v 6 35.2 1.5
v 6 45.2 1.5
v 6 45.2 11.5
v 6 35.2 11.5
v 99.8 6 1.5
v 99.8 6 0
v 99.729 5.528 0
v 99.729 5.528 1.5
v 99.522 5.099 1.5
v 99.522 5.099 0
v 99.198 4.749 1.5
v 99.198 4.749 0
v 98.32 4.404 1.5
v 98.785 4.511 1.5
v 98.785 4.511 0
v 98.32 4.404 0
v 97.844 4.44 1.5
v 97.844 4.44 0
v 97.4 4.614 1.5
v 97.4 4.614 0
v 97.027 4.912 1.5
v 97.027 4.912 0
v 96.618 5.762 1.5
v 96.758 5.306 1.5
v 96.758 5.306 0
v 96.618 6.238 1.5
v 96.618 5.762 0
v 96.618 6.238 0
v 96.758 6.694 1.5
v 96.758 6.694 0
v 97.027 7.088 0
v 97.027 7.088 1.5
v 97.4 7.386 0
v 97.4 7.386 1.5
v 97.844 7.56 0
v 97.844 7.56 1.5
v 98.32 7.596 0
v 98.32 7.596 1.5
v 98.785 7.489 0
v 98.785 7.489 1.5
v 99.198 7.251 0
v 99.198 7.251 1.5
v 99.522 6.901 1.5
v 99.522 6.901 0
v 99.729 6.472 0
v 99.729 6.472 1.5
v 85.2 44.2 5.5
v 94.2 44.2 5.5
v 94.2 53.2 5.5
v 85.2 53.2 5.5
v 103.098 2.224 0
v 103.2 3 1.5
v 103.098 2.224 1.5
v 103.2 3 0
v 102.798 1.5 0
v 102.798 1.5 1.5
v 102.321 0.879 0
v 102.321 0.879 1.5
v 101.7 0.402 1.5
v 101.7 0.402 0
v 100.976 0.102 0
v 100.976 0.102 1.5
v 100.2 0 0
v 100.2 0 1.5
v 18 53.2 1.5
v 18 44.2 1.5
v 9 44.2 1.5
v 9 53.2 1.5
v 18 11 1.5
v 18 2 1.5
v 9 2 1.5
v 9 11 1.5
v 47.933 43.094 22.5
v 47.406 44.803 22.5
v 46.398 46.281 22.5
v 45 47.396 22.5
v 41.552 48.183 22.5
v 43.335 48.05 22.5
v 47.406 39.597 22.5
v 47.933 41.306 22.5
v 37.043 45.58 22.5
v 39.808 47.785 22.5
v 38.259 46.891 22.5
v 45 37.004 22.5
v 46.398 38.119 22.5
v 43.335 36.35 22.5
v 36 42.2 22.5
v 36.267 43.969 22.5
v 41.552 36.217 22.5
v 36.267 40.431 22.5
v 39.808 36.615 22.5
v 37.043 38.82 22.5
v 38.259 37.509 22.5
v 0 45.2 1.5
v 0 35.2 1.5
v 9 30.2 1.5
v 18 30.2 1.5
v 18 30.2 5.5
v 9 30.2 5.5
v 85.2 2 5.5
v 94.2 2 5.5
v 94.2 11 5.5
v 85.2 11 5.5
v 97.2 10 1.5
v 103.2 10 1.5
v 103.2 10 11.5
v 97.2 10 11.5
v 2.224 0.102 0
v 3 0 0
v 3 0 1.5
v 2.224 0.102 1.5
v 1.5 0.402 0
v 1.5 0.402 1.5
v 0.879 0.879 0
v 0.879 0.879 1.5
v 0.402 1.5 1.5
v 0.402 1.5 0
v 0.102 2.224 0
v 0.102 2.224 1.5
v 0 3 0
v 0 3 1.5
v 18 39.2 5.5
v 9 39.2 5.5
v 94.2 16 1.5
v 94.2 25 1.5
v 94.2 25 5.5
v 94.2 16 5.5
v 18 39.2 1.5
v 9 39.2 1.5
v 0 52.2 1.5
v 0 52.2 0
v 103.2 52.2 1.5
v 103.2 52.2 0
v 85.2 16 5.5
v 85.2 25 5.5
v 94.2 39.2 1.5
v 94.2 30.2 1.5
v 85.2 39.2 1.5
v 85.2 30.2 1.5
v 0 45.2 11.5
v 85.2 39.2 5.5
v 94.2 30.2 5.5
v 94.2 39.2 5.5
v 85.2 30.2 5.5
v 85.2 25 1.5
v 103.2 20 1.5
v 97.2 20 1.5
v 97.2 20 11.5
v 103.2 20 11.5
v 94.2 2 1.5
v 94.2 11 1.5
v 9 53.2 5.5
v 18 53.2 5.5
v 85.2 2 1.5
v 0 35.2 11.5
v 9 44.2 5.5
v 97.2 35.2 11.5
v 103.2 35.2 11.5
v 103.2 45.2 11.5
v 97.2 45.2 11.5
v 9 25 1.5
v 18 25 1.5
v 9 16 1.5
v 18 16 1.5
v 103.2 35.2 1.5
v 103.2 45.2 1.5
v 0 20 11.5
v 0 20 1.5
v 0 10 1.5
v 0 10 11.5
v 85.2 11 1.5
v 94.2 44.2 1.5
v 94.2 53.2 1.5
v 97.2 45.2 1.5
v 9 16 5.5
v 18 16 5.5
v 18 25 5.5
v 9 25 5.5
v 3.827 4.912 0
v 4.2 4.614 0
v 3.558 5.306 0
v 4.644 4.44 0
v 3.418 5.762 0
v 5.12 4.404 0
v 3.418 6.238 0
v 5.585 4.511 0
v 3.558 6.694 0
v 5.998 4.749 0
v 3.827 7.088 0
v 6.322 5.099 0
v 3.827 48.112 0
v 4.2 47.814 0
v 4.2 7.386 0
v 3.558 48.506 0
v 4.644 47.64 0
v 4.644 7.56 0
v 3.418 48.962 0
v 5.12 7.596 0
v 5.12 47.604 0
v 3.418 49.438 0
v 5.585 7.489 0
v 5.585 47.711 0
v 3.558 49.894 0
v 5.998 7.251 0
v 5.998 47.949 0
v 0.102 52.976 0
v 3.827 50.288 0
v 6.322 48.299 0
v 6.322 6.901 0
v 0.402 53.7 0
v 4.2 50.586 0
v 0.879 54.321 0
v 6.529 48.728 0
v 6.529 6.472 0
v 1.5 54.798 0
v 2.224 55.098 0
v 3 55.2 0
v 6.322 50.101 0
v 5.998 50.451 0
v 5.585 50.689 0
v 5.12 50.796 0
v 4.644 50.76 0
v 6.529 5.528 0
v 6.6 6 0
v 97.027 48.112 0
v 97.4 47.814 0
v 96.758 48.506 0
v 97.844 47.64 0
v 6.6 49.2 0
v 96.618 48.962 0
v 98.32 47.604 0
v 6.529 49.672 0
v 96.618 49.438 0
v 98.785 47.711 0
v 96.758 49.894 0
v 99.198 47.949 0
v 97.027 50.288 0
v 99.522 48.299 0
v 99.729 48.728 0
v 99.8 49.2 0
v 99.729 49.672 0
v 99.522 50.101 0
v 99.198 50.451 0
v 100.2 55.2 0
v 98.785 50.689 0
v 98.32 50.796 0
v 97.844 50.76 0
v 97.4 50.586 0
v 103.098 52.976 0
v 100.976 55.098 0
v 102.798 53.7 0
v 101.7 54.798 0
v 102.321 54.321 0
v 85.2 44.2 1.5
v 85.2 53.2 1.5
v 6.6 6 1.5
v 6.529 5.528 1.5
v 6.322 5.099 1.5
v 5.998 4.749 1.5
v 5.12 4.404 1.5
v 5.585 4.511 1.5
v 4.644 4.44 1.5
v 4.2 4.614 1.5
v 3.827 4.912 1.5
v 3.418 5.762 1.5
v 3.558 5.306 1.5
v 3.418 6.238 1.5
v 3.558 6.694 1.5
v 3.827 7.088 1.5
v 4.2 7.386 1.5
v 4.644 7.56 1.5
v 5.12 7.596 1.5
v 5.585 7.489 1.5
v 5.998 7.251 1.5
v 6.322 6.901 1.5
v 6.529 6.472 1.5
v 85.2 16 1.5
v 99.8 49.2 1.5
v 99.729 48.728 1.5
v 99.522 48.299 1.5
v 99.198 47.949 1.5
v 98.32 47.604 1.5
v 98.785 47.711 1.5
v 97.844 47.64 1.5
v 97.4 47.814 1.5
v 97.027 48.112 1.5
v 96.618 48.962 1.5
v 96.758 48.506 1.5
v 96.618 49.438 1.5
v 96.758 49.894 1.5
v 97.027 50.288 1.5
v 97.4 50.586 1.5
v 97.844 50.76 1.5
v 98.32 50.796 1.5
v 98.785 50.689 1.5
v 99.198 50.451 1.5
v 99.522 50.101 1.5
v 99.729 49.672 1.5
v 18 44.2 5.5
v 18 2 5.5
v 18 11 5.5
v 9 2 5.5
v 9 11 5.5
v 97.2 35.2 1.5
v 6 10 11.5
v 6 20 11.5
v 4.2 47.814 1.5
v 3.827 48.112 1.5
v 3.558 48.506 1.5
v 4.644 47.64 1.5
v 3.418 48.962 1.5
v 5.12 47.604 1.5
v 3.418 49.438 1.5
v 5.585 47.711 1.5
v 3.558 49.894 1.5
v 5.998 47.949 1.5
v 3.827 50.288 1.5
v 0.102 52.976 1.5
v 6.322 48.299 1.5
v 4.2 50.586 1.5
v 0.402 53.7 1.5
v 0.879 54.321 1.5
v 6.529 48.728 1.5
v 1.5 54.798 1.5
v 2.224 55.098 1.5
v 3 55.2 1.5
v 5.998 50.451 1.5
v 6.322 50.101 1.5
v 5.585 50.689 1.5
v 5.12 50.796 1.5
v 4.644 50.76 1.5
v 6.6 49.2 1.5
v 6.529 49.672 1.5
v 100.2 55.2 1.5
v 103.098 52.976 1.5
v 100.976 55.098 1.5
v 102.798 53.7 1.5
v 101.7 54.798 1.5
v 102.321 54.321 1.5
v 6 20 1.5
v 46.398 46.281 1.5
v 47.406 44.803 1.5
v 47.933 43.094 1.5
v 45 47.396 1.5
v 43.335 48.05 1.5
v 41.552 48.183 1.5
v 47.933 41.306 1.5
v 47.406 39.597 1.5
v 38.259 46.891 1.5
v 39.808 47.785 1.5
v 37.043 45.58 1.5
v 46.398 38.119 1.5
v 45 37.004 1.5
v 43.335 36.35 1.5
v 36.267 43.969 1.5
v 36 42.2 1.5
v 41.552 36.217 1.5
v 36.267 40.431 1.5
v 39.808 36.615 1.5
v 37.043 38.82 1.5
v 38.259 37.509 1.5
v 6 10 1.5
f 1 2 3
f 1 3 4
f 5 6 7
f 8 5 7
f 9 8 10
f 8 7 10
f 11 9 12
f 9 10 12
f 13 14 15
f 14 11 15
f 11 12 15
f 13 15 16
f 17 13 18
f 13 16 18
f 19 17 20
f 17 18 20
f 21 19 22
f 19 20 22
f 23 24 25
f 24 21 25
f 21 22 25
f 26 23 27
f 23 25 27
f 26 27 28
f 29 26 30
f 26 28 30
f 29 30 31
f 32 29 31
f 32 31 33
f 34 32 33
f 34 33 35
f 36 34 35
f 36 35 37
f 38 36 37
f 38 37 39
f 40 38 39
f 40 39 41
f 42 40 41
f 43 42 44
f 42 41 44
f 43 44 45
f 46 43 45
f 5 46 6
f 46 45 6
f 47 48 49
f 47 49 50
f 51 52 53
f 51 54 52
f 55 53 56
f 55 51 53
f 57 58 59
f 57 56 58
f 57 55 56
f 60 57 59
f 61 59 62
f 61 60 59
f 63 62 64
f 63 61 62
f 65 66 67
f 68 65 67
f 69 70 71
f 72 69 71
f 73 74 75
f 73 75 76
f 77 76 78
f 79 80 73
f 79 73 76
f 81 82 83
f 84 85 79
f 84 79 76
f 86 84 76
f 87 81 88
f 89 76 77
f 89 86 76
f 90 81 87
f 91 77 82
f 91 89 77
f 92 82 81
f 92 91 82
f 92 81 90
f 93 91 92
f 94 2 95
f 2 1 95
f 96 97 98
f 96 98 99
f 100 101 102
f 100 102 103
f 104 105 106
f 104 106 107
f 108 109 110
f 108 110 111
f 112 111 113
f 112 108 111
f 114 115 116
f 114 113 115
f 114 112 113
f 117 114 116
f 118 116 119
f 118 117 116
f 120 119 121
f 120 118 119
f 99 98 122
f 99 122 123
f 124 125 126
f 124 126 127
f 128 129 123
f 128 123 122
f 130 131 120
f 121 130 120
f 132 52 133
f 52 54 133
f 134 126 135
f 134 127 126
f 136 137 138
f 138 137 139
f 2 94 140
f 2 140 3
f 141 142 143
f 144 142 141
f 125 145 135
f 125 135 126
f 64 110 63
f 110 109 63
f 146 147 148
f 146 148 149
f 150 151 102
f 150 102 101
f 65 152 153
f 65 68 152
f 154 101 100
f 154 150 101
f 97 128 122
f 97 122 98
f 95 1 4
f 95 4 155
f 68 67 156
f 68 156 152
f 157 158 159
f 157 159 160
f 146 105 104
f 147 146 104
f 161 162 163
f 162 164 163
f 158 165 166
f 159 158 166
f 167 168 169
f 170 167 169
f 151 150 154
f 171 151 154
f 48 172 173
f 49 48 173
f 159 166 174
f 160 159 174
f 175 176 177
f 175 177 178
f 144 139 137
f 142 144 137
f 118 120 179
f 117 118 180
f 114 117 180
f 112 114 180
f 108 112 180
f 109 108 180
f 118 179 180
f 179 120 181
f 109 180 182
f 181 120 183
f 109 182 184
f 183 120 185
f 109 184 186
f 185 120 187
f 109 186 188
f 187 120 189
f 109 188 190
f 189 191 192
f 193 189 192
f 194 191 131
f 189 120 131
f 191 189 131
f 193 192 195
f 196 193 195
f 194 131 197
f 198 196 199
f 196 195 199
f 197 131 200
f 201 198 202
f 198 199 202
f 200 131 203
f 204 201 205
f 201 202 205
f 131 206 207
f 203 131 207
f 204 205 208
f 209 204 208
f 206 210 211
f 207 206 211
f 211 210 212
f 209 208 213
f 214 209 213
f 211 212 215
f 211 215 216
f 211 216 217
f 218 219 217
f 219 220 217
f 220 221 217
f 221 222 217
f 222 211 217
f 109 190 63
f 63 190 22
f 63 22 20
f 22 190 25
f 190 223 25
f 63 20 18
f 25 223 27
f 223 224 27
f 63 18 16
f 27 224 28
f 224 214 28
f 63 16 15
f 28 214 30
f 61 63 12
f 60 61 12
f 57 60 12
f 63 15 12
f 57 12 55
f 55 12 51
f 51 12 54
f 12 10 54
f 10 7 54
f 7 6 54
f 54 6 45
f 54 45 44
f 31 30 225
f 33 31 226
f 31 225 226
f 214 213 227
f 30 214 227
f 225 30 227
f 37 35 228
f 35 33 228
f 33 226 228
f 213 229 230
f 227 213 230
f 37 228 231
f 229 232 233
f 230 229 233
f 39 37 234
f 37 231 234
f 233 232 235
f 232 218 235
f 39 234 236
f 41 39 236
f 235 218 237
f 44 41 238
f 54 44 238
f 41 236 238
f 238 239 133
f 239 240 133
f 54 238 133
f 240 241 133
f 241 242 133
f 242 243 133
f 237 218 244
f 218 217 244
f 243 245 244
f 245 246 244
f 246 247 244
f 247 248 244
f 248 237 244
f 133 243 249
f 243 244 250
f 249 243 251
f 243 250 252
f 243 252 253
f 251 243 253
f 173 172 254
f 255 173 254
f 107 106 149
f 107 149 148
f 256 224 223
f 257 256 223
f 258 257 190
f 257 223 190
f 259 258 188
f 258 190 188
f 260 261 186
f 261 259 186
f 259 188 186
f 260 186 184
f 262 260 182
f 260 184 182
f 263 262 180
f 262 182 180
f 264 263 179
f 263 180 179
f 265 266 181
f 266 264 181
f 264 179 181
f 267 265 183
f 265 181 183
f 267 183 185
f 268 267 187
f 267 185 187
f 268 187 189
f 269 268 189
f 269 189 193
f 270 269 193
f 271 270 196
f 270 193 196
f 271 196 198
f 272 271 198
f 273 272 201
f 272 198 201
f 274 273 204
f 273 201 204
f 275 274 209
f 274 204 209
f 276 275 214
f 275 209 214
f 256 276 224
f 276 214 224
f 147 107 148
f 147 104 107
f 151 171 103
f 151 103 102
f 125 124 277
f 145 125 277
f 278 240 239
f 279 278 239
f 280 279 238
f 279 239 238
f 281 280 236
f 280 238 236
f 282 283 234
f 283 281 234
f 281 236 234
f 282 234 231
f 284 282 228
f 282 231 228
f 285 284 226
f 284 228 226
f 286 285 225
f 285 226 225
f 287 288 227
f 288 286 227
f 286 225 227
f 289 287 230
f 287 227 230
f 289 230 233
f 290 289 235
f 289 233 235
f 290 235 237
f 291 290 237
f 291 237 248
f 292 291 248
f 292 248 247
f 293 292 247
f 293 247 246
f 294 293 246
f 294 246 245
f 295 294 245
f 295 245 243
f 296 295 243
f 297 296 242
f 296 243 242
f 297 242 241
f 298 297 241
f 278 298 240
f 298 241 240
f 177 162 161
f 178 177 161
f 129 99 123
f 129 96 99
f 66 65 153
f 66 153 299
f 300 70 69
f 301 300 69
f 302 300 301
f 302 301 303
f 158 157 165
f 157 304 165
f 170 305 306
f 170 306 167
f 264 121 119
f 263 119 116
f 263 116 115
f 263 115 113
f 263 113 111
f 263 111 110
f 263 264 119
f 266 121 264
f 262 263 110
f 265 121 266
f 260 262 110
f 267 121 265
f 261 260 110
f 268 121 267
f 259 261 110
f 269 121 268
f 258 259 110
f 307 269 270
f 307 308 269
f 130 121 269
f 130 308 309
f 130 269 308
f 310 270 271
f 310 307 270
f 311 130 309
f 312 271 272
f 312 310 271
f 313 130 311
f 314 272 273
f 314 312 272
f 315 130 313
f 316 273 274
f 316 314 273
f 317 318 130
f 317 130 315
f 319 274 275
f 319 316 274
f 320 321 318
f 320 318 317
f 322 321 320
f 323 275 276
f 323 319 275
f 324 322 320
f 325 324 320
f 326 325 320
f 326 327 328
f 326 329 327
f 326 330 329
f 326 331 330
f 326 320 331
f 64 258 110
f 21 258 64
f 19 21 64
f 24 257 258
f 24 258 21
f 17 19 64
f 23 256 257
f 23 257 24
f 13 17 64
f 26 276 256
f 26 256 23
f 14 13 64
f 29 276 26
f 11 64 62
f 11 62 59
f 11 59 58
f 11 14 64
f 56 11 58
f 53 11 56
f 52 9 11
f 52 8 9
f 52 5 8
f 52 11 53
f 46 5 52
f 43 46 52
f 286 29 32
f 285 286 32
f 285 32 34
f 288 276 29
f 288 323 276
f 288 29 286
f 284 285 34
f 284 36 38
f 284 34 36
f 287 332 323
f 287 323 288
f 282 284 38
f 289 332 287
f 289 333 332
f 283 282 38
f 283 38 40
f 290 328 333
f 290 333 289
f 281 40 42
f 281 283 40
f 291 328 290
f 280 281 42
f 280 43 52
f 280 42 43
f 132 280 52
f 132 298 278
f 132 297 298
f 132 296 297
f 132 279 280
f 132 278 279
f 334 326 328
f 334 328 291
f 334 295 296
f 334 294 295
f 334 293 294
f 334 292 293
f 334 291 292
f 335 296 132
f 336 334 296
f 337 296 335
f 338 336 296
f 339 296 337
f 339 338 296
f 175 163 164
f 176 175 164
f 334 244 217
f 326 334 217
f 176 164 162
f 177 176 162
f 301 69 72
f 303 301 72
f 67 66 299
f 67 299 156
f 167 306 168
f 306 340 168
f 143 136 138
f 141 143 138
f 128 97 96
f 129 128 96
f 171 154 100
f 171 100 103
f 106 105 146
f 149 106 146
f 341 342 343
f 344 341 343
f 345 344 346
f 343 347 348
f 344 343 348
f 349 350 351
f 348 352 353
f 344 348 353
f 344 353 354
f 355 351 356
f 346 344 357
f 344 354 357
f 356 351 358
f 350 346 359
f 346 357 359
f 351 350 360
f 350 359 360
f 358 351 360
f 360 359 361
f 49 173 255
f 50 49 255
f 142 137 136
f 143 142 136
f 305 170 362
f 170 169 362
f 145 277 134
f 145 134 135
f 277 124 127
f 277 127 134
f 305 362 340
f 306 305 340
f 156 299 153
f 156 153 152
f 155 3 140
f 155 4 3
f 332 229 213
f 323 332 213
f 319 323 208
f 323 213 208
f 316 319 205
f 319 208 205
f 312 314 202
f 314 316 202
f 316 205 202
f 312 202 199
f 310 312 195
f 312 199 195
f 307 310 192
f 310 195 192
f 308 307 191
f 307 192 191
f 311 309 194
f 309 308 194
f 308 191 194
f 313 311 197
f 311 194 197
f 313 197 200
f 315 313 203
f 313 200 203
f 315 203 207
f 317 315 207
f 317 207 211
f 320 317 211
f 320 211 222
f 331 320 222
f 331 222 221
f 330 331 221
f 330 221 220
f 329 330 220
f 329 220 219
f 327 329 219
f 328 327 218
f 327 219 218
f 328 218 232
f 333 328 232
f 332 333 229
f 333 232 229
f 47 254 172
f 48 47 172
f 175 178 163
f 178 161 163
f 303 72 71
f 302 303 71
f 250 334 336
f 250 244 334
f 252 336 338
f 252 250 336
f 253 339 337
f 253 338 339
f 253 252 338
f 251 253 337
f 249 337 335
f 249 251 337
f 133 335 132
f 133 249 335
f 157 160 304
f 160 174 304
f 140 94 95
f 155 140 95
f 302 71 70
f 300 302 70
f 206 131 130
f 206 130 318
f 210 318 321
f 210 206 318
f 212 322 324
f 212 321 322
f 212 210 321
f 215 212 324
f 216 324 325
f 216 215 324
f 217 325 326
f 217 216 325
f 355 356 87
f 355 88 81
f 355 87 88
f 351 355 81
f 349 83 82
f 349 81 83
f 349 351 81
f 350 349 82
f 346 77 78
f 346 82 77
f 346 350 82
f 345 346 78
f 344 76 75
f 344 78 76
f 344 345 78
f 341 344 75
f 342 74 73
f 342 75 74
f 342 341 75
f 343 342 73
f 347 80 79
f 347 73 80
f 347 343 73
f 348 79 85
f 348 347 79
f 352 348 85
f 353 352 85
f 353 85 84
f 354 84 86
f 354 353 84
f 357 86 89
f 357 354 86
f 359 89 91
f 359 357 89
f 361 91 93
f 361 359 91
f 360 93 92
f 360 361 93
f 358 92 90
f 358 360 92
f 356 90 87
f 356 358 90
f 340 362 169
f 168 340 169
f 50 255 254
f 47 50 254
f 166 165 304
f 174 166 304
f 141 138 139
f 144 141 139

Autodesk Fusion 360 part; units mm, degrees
sketch "草图1" plane through (0, 0, 0) normal (0, 0, 1) x (1, 0, 0)
  line L0 (3, 0) -> (100.2, 0)
  line L1 (103.2, 3) -> (103.2, 52.2)
  line L2 (100.2, 55.2) -> (3, 55.2)
  line L3 (0, 52.2) -> (0, 3)
  line L4 (-10, 27.6) -> (117.08, 27.6)
  line L5 (51.6, 65) -> (51.6, -15)
  circle A0 centre (5, 49.2) radius 1.6
  circle A1 centre (98.2, 49.2) radius 1.6
  circle A2 centre (5, 6) radius 1.6
  circle A3 centre (98.2, 6) radius 1.6
  arc A4 (3, 55.2) -> (0, 52.2) centre (3, 52.2) ccw
  arc A5 (103.2, 52.2) -> (100.2, 55.2) centre (100.2, 52.2) ccw
  arc A6 (100.2, 0) -> (103.2, 3) centre (100.2, 3) ccw
  arc A7 (0, 3) -> (3, 0) centre (3, 3) ccw
  point P0 (103.2, 0)
  point P1 (0, 55.2)
  dimension "d1" = 103.2
  dimension "d2" = 55.2
  dimension "d3" = 3.2
  dimension "d4" = 93.2
  dimension "d5" = 43.2
  dimension "d6" = 3
extrude "拉伸1" add sketch "草图1" along normal blind 1.5 makes body 1
sketch "草图2" plane through (0, 0, 1.5) normal (0, 0, 1) x (-1, 0, 0)
  circle A0 centre (-98.2, -6) radius 1.6
  circle A1 centre (-5, -49.2) radius 1.6
  circle A2 centre (-5, -6) radius 1.6
  circle A3 centre (-98.2, -49.2) radius 1.6
  arc A4 (0, -3) -> (-3, 0) centre (-3, -3) ccw
  line L0 (-3, 0) -> (-100.2, 0)
  arc A5 (-100.2, 0) -> (-103.2, -3) centre (-100.2, -3) ccw
  line L1 (-103.2, -3) -> (-103.2, -52.2)
  arc A6 (-103.2, -52.2) -> (-100.2, -55.2) centre (-100.2, -52.2) ccw
  line L2 (-100.2, -55.2) -> (-3, -55.2)
  arc A7 (-3, -55.2) -> (0, -52.2) centre (-3, -52.2) ccw
  line L3 (0, -52.2) -> (0, -3)
  line L4 (11.7384, -27.6) -> (-122.0621, -27.6)
  line L5 (-51.6, -62.4053) -> (-51.6, 35)
  line L6 (0, -45.2) -> (-6, -45.2)
  line L7 (-6, -45.2) -> (-6, -35.2)
  line L8 (-6, -35.2) -> (0, -35.2)
  line L9 (0, -35.2) -> (0, -45.2)
  line L10 (-97.2, -35.2) -> (-103.2, -35.2)
  line L11 (-103.2, -35.2) -> (-103.2, -45.2)
  line L12 (-103.2, -45.2) -> (-97.2, -45.2)
  line L13 (-97.2, -45.2) -> (-97.2, -35.2)
  line L14 (0, -10) -> (-6, -10)
  line L15 (-6, -10) -> (-6, -20)
  line L16 (0, -20) -> (0, -10)
  line L17 (-6, -20) -> (0, -20)
  line L18 (-97.2, -20) -> (-103.2, -20)
  line L19 (-103.2, -10) -> (-97.2, -10)
  line L20 (-97.2, -10) -> (-97.2, -20)
  line L21 (-103.2, -20) -> (-103.2, -10)
  dimension "d9" = 10
  dimension "d10" = 6
  dimension "d11" = 10
extrude "拉伸2" add sketch "草图2" along normal blind 10 separate body contours L3 L14 L15 L16 L17 | L3 L6 L7 L8 L9 | L1 L18 L19 L20 L21 | L1 L10 L11 L12 L13 makes body 2 at (0, 16.6667, 4.8333) makes body 3 at (97.2, 41.8667, 4.8333) makes body 4 at (0, 41.8667, 4.8333) makes body 5 at (97.2, 13.3333, 4.8333)
sketch "草图3" plane through (0, 0, 1.5) normal (0, 0, 1) x (-1, 0, 0)
  circle A0 centre (-98.2, -6) radius 1.6
  circle A1 centre (-5, -49.2) radius 1.6
  circle A2 centre (-5, -6) radius 1.6
  circle A3 centre (-98.2, -49.2) radius 1.6
  arc A4 (0, -3) -> (-3, 0) centre (-3, -3) ccw
  line L0 (-3, 0) -> (-100.2, 0)
  arc A5 (-100.2, 0) -> (-103.2, -3) centre (-100.2, -3) ccw
  line L1 (-103.2, -3) -> (-103.2, -52.2)
  arc A6 (-103.2, -52.2) -> (-100.2, -55.2) centre (-100.2, -52.2) ccw
  line L2 (-100.2, -55.2) -> (-3, -55.2)
  arc A7 (-3, -55.2) -> (0, -52.2) centre (-3, -52.2) ccw
  line L3 (0, -52.2) -> (0, -3)
  line L4 (8.1327, -27.6) -> (-117.8159, -27.6)
  line L5 (-51.6, -63.777) -> (-51.6, 13.1538)
  line L6 (-9, -53.2) -> (-18, -53.2)
  line L7 (-18, -53.2) -> (-18, -44.2)
  line L8 (-18, -44.2) -> (-9, -44.2)
  line L9 (-9, -44.2) -> (-9, -53.2)
  line L10 (-9, -39.2) -> (-18, -39.2)
  line L11 (-18, -39.2) -> (-18, -30.2)
  line L12 (-18, -30.2) -> (-9, -30.2)
  line L13 (-9, -30.2) -> (-9, -39.2)
  line L14 (-18, -11) -> (-9, -11)
  line L15 (-9, -2) -> (-18, -2)
  line L16 (-9, -11) -> (-9, -2)
  line L17 (-18, -2) -> (-18, -11)
  line L18 (-9, -16) -> (-18, -16)
  line L19 (-9, -25) -> (-9, -16)
  line L20 (-18, -16) -> (-18, -25)
  line L21 (-18, -25) -> (-9, -25)
  line L22 (-94.2, -53.2) -> (-85.2, -53.2)
  line L23 (-94.2, -44.2) -> (-94.2, -53.2)
  line L24 (-85.2, -53.2) -> (-85.2, -44.2)
  line L25 (-85.2, -44.2) -> (-94.2, -44.2)
  line L26 (-94.2, -39.2) -> (-85.2, -39.2)
  line L27 (-94.2, -30.2) -> (-94.2, -39.2)
  line L28 (-85.2, -39.2) -> (-85.2, -30.2)
  line L29 (-85.2, -30.2) -> (-94.2, -30.2)
  line L30 (-85.2, -25) -> (-94.2, -25)
  line L31 (-94.2, -25) -> (-94.2, -16)
  line L32 (-85.2, -16) -> (-85.2, -25)
  line L33 (-94.2, -16) -> (-85.2, -16)
  line L34 (-85.2, -11) -> (-94.2, -11)
  line L35 (-94.2, -11) -> (-94.2, -2)
  line L36 (-85.2, -2) -> (-85.2, -11)
  line L37 (-94.2, -2) -> (-85.2, -2)
  dimension "d14" = 9
  dimension "d15" = 9
  dimension "d16" = 9
  dimension "d17" = 9
  dimension "d18" = 2
  dimension "d19" = 16
  dimension "d20" = 9
  dimension "d21" = 9
extrude "拉伸3" add sketch "草图3" along normal blind 4 separate body contours L6 L7 L8 L9 | L10 L11 L12 L13 | L14 L15 L16 L17 | L18 L19 L20 L21 | L22 L23 L24 L25 | L26 L27 L28 L29 | L30 L31 L32 L33 | L34 L35 L36 L37 makes body 6 at (88.2, 33.2, 1.5) makes body 7 at (12, 36.2, 1.5) makes body 8 at (15, 22, 1.5) makes body 9 at (91.2, 19, 1.5) makes body 10 at (88.2, 47.2, 1.5) makes body 11 at (15, 50.2, 1.5) makes body 12 at (12, 8, 1.5) makes body 13 at (88.2, 8, 1.5)
sketch "草图4" plane through (0, 0, 1.5) normal (0, 0, 1) x (-1, 0, 0)
  circle A0 centre (-98.2, -6) radius 1.6
  circle A1 centre (-5, -49.2) radius 1.6
  circle A2 centre (-5, -6) radius 1.6
  circle A3 centre (-98.2, -49.2) radius 1.6
  arc A4 (0, -3) -> (-3, 0) centre (-3, -3) ccw
  line L0 (-3, 0) -> (-100.2, 0)
  arc A5 (-100.2, 0) -> (-103.2, -3) centre (-100.2, -3) ccw
  line L1 (-103.2, -3) -> (-103.2, -52.2)
  arc A6 (-103.2, -52.2) -> (-100.2, -55.2) centre (-100.2, -52.2) ccw
  line L2 (-100.2, -55.2) -> (-3, -55.2)
  arc A7 (-3, -55.2) -> (0, -52.2) centre (-3, -52.2) ccw
  line L3 (0, -52.2) -> (0, -3)
  circle A8 centre (-42, -42.2) radius 6
  dimension "d24" = 42
  dimension "d25" = 13
  dimension "d26" = 12
extrude "拉伸4" add sketch "草图4" along normal blind 21 separate body contours A8 makes body 14
sketch "草图5" plane through (0, 0, 1.5) normal (0, 0, 1) x (-1, 0, 0)
  circle A0 centre (-98.2, -6) radius 1.6
  circle A1 centre (-5, -49.2) radius 1.6
  circle A2 centre (-5, -6) radius 1.6
  circle A3 centre (-98.2, -49.2) radius 1.6
  arc A4 (0, -3) -> (-3, 0) centre (-3, -3) ccw
  line L0 (-3, 0) -> (-100.2, 0)
  arc A5 (-100.2, 0) -> (-103.2, -3) centre (-100.2, -3) ccw
  line L1 (-103.2, -3) -> (-103.2, -52.2)
  arc A6 (-103.2, -52.2) -> (-100.2, -55.2) centre (-100.2, -52.2) ccw
  line L2 (-100.2, -55.2) -> (-3, -55.2)
  arc A7 (-3, -55.2) -> (0, -52.2) centre (-3, -52.2) ccw
  line L3 (0, -52.2) -> (0, -3)
sketch "草图6" plane through (0, 0, 1.5) normal (0, 0, 1) x (1, 0, 0)
copy_body "实体->零部件1" bodies 1 removing the originals makes body 15 in component "Component'"
copy_body "实体->零部件2" bodies 2 removing the originals makes body 16 in component "Component''"
copy_body "实体->零部件3" bodies 3 removing the originals makes body 17 in component "Component'''"
copy_body "实体->零部件4" bodies 4 removing the originals makes body 18 in component "Component''''"
copy_body "实体->零部件5" bodies 5 removing the originals makes body 19 in component "Component'''''"
copy_body "实体->零部件6" bodies 6 removing the originals makes body 20 in component "Component''''''"
copy_body "实体->零部件7" bodies 7 removing the originals makes body 21 in component "Component'''''''"
copy_body "实体->零部件8" bodies 8 removing the originals makes body 22 in component "Component''''''''"
copy_body "实体->零部件9" bodies 9 removing the originals makes body 23 in component "Component'''''''''"
copy_body "实体->零部件10" bodies 10 removing the originals makes body 24 in component "Component''''''''''"
copy_body "实体->零部件11" bodies 11 removing the originals makes body 25 in component "Component'''''''''''"
copy_body "实体->零部件12" bodies 12 removing the originals makes body 26 in component "Component''''''''''''"
copy_body "实体->零部件13" bodies 13 removing the originals makes body 27 in component "Component'''''''''''''"
copy_body "实体->零部件14" bodies 14 removing the originals makes body 28 in component "Component''''''''''''''"
component "Component'" placed x (1, 0, 0) y (0, 1, 0) z (0, 0, 1) at (0, 0, 0)
component "Component''" placed x (1, 0, 0) y (0, 1, 0) z (0, 0, 1) at (0, 0, 0)
component "Component'''" placed x (1, 0, 0) y (0, 1, 0) z (0, 0, 1) at (0, 0, 0)
component "Component''''" placed x (1, 0, 0) y (0, 1, 0) z (0, 0, 1) at (0, 0, 0)
component "Component'''''" placed x (1, 0, 0) y (0, 1, 0) z (0, 0, 1) at (0, 0, 0)
component "Component''''''" placed x (1, 0, 0) y (0, 1, 0) z (0, 0, 1) at (0, 0, 0)
component "Component'''''''" placed x (1, 0, 0) y (0, 1, 0) z (0, 0, 1) at (0, 0, 0)
component "Component''''''''" placed x (1, 0, 0) y (0, 1, 0) z (0, 0, 1) at (0, 0, 0)
component "Component'''''''''" placed x (1, 0, 0) y (0, 1, 0) z (0, 0, 1) at (0, 0, 0)
component "Component''''''''''" placed x (1, 0, 0) y (0, 1, 0) z (0, 0, 1) at (0, 0, 0)
component "Component'''''''''''" placed x (1, 0, 0) y (0, 1, 0) z (0, 0, 1) at (0, 0, 0)
component "Component''''''''''''" placed x (1, 0, 0) y (0, 1, 0) z (0, 0, 1) at (0, 0, 0)
component "Component'''''''''''''" placed x (1, 0, 0) y (0, 1, 0) z (0, 0, 1) at (0, 0, 0)
component "Component''''''''''''''" placed x (1, 0, 0) y (0, 1, 0) z (0, 0, 1) at (0, 0, 0)
